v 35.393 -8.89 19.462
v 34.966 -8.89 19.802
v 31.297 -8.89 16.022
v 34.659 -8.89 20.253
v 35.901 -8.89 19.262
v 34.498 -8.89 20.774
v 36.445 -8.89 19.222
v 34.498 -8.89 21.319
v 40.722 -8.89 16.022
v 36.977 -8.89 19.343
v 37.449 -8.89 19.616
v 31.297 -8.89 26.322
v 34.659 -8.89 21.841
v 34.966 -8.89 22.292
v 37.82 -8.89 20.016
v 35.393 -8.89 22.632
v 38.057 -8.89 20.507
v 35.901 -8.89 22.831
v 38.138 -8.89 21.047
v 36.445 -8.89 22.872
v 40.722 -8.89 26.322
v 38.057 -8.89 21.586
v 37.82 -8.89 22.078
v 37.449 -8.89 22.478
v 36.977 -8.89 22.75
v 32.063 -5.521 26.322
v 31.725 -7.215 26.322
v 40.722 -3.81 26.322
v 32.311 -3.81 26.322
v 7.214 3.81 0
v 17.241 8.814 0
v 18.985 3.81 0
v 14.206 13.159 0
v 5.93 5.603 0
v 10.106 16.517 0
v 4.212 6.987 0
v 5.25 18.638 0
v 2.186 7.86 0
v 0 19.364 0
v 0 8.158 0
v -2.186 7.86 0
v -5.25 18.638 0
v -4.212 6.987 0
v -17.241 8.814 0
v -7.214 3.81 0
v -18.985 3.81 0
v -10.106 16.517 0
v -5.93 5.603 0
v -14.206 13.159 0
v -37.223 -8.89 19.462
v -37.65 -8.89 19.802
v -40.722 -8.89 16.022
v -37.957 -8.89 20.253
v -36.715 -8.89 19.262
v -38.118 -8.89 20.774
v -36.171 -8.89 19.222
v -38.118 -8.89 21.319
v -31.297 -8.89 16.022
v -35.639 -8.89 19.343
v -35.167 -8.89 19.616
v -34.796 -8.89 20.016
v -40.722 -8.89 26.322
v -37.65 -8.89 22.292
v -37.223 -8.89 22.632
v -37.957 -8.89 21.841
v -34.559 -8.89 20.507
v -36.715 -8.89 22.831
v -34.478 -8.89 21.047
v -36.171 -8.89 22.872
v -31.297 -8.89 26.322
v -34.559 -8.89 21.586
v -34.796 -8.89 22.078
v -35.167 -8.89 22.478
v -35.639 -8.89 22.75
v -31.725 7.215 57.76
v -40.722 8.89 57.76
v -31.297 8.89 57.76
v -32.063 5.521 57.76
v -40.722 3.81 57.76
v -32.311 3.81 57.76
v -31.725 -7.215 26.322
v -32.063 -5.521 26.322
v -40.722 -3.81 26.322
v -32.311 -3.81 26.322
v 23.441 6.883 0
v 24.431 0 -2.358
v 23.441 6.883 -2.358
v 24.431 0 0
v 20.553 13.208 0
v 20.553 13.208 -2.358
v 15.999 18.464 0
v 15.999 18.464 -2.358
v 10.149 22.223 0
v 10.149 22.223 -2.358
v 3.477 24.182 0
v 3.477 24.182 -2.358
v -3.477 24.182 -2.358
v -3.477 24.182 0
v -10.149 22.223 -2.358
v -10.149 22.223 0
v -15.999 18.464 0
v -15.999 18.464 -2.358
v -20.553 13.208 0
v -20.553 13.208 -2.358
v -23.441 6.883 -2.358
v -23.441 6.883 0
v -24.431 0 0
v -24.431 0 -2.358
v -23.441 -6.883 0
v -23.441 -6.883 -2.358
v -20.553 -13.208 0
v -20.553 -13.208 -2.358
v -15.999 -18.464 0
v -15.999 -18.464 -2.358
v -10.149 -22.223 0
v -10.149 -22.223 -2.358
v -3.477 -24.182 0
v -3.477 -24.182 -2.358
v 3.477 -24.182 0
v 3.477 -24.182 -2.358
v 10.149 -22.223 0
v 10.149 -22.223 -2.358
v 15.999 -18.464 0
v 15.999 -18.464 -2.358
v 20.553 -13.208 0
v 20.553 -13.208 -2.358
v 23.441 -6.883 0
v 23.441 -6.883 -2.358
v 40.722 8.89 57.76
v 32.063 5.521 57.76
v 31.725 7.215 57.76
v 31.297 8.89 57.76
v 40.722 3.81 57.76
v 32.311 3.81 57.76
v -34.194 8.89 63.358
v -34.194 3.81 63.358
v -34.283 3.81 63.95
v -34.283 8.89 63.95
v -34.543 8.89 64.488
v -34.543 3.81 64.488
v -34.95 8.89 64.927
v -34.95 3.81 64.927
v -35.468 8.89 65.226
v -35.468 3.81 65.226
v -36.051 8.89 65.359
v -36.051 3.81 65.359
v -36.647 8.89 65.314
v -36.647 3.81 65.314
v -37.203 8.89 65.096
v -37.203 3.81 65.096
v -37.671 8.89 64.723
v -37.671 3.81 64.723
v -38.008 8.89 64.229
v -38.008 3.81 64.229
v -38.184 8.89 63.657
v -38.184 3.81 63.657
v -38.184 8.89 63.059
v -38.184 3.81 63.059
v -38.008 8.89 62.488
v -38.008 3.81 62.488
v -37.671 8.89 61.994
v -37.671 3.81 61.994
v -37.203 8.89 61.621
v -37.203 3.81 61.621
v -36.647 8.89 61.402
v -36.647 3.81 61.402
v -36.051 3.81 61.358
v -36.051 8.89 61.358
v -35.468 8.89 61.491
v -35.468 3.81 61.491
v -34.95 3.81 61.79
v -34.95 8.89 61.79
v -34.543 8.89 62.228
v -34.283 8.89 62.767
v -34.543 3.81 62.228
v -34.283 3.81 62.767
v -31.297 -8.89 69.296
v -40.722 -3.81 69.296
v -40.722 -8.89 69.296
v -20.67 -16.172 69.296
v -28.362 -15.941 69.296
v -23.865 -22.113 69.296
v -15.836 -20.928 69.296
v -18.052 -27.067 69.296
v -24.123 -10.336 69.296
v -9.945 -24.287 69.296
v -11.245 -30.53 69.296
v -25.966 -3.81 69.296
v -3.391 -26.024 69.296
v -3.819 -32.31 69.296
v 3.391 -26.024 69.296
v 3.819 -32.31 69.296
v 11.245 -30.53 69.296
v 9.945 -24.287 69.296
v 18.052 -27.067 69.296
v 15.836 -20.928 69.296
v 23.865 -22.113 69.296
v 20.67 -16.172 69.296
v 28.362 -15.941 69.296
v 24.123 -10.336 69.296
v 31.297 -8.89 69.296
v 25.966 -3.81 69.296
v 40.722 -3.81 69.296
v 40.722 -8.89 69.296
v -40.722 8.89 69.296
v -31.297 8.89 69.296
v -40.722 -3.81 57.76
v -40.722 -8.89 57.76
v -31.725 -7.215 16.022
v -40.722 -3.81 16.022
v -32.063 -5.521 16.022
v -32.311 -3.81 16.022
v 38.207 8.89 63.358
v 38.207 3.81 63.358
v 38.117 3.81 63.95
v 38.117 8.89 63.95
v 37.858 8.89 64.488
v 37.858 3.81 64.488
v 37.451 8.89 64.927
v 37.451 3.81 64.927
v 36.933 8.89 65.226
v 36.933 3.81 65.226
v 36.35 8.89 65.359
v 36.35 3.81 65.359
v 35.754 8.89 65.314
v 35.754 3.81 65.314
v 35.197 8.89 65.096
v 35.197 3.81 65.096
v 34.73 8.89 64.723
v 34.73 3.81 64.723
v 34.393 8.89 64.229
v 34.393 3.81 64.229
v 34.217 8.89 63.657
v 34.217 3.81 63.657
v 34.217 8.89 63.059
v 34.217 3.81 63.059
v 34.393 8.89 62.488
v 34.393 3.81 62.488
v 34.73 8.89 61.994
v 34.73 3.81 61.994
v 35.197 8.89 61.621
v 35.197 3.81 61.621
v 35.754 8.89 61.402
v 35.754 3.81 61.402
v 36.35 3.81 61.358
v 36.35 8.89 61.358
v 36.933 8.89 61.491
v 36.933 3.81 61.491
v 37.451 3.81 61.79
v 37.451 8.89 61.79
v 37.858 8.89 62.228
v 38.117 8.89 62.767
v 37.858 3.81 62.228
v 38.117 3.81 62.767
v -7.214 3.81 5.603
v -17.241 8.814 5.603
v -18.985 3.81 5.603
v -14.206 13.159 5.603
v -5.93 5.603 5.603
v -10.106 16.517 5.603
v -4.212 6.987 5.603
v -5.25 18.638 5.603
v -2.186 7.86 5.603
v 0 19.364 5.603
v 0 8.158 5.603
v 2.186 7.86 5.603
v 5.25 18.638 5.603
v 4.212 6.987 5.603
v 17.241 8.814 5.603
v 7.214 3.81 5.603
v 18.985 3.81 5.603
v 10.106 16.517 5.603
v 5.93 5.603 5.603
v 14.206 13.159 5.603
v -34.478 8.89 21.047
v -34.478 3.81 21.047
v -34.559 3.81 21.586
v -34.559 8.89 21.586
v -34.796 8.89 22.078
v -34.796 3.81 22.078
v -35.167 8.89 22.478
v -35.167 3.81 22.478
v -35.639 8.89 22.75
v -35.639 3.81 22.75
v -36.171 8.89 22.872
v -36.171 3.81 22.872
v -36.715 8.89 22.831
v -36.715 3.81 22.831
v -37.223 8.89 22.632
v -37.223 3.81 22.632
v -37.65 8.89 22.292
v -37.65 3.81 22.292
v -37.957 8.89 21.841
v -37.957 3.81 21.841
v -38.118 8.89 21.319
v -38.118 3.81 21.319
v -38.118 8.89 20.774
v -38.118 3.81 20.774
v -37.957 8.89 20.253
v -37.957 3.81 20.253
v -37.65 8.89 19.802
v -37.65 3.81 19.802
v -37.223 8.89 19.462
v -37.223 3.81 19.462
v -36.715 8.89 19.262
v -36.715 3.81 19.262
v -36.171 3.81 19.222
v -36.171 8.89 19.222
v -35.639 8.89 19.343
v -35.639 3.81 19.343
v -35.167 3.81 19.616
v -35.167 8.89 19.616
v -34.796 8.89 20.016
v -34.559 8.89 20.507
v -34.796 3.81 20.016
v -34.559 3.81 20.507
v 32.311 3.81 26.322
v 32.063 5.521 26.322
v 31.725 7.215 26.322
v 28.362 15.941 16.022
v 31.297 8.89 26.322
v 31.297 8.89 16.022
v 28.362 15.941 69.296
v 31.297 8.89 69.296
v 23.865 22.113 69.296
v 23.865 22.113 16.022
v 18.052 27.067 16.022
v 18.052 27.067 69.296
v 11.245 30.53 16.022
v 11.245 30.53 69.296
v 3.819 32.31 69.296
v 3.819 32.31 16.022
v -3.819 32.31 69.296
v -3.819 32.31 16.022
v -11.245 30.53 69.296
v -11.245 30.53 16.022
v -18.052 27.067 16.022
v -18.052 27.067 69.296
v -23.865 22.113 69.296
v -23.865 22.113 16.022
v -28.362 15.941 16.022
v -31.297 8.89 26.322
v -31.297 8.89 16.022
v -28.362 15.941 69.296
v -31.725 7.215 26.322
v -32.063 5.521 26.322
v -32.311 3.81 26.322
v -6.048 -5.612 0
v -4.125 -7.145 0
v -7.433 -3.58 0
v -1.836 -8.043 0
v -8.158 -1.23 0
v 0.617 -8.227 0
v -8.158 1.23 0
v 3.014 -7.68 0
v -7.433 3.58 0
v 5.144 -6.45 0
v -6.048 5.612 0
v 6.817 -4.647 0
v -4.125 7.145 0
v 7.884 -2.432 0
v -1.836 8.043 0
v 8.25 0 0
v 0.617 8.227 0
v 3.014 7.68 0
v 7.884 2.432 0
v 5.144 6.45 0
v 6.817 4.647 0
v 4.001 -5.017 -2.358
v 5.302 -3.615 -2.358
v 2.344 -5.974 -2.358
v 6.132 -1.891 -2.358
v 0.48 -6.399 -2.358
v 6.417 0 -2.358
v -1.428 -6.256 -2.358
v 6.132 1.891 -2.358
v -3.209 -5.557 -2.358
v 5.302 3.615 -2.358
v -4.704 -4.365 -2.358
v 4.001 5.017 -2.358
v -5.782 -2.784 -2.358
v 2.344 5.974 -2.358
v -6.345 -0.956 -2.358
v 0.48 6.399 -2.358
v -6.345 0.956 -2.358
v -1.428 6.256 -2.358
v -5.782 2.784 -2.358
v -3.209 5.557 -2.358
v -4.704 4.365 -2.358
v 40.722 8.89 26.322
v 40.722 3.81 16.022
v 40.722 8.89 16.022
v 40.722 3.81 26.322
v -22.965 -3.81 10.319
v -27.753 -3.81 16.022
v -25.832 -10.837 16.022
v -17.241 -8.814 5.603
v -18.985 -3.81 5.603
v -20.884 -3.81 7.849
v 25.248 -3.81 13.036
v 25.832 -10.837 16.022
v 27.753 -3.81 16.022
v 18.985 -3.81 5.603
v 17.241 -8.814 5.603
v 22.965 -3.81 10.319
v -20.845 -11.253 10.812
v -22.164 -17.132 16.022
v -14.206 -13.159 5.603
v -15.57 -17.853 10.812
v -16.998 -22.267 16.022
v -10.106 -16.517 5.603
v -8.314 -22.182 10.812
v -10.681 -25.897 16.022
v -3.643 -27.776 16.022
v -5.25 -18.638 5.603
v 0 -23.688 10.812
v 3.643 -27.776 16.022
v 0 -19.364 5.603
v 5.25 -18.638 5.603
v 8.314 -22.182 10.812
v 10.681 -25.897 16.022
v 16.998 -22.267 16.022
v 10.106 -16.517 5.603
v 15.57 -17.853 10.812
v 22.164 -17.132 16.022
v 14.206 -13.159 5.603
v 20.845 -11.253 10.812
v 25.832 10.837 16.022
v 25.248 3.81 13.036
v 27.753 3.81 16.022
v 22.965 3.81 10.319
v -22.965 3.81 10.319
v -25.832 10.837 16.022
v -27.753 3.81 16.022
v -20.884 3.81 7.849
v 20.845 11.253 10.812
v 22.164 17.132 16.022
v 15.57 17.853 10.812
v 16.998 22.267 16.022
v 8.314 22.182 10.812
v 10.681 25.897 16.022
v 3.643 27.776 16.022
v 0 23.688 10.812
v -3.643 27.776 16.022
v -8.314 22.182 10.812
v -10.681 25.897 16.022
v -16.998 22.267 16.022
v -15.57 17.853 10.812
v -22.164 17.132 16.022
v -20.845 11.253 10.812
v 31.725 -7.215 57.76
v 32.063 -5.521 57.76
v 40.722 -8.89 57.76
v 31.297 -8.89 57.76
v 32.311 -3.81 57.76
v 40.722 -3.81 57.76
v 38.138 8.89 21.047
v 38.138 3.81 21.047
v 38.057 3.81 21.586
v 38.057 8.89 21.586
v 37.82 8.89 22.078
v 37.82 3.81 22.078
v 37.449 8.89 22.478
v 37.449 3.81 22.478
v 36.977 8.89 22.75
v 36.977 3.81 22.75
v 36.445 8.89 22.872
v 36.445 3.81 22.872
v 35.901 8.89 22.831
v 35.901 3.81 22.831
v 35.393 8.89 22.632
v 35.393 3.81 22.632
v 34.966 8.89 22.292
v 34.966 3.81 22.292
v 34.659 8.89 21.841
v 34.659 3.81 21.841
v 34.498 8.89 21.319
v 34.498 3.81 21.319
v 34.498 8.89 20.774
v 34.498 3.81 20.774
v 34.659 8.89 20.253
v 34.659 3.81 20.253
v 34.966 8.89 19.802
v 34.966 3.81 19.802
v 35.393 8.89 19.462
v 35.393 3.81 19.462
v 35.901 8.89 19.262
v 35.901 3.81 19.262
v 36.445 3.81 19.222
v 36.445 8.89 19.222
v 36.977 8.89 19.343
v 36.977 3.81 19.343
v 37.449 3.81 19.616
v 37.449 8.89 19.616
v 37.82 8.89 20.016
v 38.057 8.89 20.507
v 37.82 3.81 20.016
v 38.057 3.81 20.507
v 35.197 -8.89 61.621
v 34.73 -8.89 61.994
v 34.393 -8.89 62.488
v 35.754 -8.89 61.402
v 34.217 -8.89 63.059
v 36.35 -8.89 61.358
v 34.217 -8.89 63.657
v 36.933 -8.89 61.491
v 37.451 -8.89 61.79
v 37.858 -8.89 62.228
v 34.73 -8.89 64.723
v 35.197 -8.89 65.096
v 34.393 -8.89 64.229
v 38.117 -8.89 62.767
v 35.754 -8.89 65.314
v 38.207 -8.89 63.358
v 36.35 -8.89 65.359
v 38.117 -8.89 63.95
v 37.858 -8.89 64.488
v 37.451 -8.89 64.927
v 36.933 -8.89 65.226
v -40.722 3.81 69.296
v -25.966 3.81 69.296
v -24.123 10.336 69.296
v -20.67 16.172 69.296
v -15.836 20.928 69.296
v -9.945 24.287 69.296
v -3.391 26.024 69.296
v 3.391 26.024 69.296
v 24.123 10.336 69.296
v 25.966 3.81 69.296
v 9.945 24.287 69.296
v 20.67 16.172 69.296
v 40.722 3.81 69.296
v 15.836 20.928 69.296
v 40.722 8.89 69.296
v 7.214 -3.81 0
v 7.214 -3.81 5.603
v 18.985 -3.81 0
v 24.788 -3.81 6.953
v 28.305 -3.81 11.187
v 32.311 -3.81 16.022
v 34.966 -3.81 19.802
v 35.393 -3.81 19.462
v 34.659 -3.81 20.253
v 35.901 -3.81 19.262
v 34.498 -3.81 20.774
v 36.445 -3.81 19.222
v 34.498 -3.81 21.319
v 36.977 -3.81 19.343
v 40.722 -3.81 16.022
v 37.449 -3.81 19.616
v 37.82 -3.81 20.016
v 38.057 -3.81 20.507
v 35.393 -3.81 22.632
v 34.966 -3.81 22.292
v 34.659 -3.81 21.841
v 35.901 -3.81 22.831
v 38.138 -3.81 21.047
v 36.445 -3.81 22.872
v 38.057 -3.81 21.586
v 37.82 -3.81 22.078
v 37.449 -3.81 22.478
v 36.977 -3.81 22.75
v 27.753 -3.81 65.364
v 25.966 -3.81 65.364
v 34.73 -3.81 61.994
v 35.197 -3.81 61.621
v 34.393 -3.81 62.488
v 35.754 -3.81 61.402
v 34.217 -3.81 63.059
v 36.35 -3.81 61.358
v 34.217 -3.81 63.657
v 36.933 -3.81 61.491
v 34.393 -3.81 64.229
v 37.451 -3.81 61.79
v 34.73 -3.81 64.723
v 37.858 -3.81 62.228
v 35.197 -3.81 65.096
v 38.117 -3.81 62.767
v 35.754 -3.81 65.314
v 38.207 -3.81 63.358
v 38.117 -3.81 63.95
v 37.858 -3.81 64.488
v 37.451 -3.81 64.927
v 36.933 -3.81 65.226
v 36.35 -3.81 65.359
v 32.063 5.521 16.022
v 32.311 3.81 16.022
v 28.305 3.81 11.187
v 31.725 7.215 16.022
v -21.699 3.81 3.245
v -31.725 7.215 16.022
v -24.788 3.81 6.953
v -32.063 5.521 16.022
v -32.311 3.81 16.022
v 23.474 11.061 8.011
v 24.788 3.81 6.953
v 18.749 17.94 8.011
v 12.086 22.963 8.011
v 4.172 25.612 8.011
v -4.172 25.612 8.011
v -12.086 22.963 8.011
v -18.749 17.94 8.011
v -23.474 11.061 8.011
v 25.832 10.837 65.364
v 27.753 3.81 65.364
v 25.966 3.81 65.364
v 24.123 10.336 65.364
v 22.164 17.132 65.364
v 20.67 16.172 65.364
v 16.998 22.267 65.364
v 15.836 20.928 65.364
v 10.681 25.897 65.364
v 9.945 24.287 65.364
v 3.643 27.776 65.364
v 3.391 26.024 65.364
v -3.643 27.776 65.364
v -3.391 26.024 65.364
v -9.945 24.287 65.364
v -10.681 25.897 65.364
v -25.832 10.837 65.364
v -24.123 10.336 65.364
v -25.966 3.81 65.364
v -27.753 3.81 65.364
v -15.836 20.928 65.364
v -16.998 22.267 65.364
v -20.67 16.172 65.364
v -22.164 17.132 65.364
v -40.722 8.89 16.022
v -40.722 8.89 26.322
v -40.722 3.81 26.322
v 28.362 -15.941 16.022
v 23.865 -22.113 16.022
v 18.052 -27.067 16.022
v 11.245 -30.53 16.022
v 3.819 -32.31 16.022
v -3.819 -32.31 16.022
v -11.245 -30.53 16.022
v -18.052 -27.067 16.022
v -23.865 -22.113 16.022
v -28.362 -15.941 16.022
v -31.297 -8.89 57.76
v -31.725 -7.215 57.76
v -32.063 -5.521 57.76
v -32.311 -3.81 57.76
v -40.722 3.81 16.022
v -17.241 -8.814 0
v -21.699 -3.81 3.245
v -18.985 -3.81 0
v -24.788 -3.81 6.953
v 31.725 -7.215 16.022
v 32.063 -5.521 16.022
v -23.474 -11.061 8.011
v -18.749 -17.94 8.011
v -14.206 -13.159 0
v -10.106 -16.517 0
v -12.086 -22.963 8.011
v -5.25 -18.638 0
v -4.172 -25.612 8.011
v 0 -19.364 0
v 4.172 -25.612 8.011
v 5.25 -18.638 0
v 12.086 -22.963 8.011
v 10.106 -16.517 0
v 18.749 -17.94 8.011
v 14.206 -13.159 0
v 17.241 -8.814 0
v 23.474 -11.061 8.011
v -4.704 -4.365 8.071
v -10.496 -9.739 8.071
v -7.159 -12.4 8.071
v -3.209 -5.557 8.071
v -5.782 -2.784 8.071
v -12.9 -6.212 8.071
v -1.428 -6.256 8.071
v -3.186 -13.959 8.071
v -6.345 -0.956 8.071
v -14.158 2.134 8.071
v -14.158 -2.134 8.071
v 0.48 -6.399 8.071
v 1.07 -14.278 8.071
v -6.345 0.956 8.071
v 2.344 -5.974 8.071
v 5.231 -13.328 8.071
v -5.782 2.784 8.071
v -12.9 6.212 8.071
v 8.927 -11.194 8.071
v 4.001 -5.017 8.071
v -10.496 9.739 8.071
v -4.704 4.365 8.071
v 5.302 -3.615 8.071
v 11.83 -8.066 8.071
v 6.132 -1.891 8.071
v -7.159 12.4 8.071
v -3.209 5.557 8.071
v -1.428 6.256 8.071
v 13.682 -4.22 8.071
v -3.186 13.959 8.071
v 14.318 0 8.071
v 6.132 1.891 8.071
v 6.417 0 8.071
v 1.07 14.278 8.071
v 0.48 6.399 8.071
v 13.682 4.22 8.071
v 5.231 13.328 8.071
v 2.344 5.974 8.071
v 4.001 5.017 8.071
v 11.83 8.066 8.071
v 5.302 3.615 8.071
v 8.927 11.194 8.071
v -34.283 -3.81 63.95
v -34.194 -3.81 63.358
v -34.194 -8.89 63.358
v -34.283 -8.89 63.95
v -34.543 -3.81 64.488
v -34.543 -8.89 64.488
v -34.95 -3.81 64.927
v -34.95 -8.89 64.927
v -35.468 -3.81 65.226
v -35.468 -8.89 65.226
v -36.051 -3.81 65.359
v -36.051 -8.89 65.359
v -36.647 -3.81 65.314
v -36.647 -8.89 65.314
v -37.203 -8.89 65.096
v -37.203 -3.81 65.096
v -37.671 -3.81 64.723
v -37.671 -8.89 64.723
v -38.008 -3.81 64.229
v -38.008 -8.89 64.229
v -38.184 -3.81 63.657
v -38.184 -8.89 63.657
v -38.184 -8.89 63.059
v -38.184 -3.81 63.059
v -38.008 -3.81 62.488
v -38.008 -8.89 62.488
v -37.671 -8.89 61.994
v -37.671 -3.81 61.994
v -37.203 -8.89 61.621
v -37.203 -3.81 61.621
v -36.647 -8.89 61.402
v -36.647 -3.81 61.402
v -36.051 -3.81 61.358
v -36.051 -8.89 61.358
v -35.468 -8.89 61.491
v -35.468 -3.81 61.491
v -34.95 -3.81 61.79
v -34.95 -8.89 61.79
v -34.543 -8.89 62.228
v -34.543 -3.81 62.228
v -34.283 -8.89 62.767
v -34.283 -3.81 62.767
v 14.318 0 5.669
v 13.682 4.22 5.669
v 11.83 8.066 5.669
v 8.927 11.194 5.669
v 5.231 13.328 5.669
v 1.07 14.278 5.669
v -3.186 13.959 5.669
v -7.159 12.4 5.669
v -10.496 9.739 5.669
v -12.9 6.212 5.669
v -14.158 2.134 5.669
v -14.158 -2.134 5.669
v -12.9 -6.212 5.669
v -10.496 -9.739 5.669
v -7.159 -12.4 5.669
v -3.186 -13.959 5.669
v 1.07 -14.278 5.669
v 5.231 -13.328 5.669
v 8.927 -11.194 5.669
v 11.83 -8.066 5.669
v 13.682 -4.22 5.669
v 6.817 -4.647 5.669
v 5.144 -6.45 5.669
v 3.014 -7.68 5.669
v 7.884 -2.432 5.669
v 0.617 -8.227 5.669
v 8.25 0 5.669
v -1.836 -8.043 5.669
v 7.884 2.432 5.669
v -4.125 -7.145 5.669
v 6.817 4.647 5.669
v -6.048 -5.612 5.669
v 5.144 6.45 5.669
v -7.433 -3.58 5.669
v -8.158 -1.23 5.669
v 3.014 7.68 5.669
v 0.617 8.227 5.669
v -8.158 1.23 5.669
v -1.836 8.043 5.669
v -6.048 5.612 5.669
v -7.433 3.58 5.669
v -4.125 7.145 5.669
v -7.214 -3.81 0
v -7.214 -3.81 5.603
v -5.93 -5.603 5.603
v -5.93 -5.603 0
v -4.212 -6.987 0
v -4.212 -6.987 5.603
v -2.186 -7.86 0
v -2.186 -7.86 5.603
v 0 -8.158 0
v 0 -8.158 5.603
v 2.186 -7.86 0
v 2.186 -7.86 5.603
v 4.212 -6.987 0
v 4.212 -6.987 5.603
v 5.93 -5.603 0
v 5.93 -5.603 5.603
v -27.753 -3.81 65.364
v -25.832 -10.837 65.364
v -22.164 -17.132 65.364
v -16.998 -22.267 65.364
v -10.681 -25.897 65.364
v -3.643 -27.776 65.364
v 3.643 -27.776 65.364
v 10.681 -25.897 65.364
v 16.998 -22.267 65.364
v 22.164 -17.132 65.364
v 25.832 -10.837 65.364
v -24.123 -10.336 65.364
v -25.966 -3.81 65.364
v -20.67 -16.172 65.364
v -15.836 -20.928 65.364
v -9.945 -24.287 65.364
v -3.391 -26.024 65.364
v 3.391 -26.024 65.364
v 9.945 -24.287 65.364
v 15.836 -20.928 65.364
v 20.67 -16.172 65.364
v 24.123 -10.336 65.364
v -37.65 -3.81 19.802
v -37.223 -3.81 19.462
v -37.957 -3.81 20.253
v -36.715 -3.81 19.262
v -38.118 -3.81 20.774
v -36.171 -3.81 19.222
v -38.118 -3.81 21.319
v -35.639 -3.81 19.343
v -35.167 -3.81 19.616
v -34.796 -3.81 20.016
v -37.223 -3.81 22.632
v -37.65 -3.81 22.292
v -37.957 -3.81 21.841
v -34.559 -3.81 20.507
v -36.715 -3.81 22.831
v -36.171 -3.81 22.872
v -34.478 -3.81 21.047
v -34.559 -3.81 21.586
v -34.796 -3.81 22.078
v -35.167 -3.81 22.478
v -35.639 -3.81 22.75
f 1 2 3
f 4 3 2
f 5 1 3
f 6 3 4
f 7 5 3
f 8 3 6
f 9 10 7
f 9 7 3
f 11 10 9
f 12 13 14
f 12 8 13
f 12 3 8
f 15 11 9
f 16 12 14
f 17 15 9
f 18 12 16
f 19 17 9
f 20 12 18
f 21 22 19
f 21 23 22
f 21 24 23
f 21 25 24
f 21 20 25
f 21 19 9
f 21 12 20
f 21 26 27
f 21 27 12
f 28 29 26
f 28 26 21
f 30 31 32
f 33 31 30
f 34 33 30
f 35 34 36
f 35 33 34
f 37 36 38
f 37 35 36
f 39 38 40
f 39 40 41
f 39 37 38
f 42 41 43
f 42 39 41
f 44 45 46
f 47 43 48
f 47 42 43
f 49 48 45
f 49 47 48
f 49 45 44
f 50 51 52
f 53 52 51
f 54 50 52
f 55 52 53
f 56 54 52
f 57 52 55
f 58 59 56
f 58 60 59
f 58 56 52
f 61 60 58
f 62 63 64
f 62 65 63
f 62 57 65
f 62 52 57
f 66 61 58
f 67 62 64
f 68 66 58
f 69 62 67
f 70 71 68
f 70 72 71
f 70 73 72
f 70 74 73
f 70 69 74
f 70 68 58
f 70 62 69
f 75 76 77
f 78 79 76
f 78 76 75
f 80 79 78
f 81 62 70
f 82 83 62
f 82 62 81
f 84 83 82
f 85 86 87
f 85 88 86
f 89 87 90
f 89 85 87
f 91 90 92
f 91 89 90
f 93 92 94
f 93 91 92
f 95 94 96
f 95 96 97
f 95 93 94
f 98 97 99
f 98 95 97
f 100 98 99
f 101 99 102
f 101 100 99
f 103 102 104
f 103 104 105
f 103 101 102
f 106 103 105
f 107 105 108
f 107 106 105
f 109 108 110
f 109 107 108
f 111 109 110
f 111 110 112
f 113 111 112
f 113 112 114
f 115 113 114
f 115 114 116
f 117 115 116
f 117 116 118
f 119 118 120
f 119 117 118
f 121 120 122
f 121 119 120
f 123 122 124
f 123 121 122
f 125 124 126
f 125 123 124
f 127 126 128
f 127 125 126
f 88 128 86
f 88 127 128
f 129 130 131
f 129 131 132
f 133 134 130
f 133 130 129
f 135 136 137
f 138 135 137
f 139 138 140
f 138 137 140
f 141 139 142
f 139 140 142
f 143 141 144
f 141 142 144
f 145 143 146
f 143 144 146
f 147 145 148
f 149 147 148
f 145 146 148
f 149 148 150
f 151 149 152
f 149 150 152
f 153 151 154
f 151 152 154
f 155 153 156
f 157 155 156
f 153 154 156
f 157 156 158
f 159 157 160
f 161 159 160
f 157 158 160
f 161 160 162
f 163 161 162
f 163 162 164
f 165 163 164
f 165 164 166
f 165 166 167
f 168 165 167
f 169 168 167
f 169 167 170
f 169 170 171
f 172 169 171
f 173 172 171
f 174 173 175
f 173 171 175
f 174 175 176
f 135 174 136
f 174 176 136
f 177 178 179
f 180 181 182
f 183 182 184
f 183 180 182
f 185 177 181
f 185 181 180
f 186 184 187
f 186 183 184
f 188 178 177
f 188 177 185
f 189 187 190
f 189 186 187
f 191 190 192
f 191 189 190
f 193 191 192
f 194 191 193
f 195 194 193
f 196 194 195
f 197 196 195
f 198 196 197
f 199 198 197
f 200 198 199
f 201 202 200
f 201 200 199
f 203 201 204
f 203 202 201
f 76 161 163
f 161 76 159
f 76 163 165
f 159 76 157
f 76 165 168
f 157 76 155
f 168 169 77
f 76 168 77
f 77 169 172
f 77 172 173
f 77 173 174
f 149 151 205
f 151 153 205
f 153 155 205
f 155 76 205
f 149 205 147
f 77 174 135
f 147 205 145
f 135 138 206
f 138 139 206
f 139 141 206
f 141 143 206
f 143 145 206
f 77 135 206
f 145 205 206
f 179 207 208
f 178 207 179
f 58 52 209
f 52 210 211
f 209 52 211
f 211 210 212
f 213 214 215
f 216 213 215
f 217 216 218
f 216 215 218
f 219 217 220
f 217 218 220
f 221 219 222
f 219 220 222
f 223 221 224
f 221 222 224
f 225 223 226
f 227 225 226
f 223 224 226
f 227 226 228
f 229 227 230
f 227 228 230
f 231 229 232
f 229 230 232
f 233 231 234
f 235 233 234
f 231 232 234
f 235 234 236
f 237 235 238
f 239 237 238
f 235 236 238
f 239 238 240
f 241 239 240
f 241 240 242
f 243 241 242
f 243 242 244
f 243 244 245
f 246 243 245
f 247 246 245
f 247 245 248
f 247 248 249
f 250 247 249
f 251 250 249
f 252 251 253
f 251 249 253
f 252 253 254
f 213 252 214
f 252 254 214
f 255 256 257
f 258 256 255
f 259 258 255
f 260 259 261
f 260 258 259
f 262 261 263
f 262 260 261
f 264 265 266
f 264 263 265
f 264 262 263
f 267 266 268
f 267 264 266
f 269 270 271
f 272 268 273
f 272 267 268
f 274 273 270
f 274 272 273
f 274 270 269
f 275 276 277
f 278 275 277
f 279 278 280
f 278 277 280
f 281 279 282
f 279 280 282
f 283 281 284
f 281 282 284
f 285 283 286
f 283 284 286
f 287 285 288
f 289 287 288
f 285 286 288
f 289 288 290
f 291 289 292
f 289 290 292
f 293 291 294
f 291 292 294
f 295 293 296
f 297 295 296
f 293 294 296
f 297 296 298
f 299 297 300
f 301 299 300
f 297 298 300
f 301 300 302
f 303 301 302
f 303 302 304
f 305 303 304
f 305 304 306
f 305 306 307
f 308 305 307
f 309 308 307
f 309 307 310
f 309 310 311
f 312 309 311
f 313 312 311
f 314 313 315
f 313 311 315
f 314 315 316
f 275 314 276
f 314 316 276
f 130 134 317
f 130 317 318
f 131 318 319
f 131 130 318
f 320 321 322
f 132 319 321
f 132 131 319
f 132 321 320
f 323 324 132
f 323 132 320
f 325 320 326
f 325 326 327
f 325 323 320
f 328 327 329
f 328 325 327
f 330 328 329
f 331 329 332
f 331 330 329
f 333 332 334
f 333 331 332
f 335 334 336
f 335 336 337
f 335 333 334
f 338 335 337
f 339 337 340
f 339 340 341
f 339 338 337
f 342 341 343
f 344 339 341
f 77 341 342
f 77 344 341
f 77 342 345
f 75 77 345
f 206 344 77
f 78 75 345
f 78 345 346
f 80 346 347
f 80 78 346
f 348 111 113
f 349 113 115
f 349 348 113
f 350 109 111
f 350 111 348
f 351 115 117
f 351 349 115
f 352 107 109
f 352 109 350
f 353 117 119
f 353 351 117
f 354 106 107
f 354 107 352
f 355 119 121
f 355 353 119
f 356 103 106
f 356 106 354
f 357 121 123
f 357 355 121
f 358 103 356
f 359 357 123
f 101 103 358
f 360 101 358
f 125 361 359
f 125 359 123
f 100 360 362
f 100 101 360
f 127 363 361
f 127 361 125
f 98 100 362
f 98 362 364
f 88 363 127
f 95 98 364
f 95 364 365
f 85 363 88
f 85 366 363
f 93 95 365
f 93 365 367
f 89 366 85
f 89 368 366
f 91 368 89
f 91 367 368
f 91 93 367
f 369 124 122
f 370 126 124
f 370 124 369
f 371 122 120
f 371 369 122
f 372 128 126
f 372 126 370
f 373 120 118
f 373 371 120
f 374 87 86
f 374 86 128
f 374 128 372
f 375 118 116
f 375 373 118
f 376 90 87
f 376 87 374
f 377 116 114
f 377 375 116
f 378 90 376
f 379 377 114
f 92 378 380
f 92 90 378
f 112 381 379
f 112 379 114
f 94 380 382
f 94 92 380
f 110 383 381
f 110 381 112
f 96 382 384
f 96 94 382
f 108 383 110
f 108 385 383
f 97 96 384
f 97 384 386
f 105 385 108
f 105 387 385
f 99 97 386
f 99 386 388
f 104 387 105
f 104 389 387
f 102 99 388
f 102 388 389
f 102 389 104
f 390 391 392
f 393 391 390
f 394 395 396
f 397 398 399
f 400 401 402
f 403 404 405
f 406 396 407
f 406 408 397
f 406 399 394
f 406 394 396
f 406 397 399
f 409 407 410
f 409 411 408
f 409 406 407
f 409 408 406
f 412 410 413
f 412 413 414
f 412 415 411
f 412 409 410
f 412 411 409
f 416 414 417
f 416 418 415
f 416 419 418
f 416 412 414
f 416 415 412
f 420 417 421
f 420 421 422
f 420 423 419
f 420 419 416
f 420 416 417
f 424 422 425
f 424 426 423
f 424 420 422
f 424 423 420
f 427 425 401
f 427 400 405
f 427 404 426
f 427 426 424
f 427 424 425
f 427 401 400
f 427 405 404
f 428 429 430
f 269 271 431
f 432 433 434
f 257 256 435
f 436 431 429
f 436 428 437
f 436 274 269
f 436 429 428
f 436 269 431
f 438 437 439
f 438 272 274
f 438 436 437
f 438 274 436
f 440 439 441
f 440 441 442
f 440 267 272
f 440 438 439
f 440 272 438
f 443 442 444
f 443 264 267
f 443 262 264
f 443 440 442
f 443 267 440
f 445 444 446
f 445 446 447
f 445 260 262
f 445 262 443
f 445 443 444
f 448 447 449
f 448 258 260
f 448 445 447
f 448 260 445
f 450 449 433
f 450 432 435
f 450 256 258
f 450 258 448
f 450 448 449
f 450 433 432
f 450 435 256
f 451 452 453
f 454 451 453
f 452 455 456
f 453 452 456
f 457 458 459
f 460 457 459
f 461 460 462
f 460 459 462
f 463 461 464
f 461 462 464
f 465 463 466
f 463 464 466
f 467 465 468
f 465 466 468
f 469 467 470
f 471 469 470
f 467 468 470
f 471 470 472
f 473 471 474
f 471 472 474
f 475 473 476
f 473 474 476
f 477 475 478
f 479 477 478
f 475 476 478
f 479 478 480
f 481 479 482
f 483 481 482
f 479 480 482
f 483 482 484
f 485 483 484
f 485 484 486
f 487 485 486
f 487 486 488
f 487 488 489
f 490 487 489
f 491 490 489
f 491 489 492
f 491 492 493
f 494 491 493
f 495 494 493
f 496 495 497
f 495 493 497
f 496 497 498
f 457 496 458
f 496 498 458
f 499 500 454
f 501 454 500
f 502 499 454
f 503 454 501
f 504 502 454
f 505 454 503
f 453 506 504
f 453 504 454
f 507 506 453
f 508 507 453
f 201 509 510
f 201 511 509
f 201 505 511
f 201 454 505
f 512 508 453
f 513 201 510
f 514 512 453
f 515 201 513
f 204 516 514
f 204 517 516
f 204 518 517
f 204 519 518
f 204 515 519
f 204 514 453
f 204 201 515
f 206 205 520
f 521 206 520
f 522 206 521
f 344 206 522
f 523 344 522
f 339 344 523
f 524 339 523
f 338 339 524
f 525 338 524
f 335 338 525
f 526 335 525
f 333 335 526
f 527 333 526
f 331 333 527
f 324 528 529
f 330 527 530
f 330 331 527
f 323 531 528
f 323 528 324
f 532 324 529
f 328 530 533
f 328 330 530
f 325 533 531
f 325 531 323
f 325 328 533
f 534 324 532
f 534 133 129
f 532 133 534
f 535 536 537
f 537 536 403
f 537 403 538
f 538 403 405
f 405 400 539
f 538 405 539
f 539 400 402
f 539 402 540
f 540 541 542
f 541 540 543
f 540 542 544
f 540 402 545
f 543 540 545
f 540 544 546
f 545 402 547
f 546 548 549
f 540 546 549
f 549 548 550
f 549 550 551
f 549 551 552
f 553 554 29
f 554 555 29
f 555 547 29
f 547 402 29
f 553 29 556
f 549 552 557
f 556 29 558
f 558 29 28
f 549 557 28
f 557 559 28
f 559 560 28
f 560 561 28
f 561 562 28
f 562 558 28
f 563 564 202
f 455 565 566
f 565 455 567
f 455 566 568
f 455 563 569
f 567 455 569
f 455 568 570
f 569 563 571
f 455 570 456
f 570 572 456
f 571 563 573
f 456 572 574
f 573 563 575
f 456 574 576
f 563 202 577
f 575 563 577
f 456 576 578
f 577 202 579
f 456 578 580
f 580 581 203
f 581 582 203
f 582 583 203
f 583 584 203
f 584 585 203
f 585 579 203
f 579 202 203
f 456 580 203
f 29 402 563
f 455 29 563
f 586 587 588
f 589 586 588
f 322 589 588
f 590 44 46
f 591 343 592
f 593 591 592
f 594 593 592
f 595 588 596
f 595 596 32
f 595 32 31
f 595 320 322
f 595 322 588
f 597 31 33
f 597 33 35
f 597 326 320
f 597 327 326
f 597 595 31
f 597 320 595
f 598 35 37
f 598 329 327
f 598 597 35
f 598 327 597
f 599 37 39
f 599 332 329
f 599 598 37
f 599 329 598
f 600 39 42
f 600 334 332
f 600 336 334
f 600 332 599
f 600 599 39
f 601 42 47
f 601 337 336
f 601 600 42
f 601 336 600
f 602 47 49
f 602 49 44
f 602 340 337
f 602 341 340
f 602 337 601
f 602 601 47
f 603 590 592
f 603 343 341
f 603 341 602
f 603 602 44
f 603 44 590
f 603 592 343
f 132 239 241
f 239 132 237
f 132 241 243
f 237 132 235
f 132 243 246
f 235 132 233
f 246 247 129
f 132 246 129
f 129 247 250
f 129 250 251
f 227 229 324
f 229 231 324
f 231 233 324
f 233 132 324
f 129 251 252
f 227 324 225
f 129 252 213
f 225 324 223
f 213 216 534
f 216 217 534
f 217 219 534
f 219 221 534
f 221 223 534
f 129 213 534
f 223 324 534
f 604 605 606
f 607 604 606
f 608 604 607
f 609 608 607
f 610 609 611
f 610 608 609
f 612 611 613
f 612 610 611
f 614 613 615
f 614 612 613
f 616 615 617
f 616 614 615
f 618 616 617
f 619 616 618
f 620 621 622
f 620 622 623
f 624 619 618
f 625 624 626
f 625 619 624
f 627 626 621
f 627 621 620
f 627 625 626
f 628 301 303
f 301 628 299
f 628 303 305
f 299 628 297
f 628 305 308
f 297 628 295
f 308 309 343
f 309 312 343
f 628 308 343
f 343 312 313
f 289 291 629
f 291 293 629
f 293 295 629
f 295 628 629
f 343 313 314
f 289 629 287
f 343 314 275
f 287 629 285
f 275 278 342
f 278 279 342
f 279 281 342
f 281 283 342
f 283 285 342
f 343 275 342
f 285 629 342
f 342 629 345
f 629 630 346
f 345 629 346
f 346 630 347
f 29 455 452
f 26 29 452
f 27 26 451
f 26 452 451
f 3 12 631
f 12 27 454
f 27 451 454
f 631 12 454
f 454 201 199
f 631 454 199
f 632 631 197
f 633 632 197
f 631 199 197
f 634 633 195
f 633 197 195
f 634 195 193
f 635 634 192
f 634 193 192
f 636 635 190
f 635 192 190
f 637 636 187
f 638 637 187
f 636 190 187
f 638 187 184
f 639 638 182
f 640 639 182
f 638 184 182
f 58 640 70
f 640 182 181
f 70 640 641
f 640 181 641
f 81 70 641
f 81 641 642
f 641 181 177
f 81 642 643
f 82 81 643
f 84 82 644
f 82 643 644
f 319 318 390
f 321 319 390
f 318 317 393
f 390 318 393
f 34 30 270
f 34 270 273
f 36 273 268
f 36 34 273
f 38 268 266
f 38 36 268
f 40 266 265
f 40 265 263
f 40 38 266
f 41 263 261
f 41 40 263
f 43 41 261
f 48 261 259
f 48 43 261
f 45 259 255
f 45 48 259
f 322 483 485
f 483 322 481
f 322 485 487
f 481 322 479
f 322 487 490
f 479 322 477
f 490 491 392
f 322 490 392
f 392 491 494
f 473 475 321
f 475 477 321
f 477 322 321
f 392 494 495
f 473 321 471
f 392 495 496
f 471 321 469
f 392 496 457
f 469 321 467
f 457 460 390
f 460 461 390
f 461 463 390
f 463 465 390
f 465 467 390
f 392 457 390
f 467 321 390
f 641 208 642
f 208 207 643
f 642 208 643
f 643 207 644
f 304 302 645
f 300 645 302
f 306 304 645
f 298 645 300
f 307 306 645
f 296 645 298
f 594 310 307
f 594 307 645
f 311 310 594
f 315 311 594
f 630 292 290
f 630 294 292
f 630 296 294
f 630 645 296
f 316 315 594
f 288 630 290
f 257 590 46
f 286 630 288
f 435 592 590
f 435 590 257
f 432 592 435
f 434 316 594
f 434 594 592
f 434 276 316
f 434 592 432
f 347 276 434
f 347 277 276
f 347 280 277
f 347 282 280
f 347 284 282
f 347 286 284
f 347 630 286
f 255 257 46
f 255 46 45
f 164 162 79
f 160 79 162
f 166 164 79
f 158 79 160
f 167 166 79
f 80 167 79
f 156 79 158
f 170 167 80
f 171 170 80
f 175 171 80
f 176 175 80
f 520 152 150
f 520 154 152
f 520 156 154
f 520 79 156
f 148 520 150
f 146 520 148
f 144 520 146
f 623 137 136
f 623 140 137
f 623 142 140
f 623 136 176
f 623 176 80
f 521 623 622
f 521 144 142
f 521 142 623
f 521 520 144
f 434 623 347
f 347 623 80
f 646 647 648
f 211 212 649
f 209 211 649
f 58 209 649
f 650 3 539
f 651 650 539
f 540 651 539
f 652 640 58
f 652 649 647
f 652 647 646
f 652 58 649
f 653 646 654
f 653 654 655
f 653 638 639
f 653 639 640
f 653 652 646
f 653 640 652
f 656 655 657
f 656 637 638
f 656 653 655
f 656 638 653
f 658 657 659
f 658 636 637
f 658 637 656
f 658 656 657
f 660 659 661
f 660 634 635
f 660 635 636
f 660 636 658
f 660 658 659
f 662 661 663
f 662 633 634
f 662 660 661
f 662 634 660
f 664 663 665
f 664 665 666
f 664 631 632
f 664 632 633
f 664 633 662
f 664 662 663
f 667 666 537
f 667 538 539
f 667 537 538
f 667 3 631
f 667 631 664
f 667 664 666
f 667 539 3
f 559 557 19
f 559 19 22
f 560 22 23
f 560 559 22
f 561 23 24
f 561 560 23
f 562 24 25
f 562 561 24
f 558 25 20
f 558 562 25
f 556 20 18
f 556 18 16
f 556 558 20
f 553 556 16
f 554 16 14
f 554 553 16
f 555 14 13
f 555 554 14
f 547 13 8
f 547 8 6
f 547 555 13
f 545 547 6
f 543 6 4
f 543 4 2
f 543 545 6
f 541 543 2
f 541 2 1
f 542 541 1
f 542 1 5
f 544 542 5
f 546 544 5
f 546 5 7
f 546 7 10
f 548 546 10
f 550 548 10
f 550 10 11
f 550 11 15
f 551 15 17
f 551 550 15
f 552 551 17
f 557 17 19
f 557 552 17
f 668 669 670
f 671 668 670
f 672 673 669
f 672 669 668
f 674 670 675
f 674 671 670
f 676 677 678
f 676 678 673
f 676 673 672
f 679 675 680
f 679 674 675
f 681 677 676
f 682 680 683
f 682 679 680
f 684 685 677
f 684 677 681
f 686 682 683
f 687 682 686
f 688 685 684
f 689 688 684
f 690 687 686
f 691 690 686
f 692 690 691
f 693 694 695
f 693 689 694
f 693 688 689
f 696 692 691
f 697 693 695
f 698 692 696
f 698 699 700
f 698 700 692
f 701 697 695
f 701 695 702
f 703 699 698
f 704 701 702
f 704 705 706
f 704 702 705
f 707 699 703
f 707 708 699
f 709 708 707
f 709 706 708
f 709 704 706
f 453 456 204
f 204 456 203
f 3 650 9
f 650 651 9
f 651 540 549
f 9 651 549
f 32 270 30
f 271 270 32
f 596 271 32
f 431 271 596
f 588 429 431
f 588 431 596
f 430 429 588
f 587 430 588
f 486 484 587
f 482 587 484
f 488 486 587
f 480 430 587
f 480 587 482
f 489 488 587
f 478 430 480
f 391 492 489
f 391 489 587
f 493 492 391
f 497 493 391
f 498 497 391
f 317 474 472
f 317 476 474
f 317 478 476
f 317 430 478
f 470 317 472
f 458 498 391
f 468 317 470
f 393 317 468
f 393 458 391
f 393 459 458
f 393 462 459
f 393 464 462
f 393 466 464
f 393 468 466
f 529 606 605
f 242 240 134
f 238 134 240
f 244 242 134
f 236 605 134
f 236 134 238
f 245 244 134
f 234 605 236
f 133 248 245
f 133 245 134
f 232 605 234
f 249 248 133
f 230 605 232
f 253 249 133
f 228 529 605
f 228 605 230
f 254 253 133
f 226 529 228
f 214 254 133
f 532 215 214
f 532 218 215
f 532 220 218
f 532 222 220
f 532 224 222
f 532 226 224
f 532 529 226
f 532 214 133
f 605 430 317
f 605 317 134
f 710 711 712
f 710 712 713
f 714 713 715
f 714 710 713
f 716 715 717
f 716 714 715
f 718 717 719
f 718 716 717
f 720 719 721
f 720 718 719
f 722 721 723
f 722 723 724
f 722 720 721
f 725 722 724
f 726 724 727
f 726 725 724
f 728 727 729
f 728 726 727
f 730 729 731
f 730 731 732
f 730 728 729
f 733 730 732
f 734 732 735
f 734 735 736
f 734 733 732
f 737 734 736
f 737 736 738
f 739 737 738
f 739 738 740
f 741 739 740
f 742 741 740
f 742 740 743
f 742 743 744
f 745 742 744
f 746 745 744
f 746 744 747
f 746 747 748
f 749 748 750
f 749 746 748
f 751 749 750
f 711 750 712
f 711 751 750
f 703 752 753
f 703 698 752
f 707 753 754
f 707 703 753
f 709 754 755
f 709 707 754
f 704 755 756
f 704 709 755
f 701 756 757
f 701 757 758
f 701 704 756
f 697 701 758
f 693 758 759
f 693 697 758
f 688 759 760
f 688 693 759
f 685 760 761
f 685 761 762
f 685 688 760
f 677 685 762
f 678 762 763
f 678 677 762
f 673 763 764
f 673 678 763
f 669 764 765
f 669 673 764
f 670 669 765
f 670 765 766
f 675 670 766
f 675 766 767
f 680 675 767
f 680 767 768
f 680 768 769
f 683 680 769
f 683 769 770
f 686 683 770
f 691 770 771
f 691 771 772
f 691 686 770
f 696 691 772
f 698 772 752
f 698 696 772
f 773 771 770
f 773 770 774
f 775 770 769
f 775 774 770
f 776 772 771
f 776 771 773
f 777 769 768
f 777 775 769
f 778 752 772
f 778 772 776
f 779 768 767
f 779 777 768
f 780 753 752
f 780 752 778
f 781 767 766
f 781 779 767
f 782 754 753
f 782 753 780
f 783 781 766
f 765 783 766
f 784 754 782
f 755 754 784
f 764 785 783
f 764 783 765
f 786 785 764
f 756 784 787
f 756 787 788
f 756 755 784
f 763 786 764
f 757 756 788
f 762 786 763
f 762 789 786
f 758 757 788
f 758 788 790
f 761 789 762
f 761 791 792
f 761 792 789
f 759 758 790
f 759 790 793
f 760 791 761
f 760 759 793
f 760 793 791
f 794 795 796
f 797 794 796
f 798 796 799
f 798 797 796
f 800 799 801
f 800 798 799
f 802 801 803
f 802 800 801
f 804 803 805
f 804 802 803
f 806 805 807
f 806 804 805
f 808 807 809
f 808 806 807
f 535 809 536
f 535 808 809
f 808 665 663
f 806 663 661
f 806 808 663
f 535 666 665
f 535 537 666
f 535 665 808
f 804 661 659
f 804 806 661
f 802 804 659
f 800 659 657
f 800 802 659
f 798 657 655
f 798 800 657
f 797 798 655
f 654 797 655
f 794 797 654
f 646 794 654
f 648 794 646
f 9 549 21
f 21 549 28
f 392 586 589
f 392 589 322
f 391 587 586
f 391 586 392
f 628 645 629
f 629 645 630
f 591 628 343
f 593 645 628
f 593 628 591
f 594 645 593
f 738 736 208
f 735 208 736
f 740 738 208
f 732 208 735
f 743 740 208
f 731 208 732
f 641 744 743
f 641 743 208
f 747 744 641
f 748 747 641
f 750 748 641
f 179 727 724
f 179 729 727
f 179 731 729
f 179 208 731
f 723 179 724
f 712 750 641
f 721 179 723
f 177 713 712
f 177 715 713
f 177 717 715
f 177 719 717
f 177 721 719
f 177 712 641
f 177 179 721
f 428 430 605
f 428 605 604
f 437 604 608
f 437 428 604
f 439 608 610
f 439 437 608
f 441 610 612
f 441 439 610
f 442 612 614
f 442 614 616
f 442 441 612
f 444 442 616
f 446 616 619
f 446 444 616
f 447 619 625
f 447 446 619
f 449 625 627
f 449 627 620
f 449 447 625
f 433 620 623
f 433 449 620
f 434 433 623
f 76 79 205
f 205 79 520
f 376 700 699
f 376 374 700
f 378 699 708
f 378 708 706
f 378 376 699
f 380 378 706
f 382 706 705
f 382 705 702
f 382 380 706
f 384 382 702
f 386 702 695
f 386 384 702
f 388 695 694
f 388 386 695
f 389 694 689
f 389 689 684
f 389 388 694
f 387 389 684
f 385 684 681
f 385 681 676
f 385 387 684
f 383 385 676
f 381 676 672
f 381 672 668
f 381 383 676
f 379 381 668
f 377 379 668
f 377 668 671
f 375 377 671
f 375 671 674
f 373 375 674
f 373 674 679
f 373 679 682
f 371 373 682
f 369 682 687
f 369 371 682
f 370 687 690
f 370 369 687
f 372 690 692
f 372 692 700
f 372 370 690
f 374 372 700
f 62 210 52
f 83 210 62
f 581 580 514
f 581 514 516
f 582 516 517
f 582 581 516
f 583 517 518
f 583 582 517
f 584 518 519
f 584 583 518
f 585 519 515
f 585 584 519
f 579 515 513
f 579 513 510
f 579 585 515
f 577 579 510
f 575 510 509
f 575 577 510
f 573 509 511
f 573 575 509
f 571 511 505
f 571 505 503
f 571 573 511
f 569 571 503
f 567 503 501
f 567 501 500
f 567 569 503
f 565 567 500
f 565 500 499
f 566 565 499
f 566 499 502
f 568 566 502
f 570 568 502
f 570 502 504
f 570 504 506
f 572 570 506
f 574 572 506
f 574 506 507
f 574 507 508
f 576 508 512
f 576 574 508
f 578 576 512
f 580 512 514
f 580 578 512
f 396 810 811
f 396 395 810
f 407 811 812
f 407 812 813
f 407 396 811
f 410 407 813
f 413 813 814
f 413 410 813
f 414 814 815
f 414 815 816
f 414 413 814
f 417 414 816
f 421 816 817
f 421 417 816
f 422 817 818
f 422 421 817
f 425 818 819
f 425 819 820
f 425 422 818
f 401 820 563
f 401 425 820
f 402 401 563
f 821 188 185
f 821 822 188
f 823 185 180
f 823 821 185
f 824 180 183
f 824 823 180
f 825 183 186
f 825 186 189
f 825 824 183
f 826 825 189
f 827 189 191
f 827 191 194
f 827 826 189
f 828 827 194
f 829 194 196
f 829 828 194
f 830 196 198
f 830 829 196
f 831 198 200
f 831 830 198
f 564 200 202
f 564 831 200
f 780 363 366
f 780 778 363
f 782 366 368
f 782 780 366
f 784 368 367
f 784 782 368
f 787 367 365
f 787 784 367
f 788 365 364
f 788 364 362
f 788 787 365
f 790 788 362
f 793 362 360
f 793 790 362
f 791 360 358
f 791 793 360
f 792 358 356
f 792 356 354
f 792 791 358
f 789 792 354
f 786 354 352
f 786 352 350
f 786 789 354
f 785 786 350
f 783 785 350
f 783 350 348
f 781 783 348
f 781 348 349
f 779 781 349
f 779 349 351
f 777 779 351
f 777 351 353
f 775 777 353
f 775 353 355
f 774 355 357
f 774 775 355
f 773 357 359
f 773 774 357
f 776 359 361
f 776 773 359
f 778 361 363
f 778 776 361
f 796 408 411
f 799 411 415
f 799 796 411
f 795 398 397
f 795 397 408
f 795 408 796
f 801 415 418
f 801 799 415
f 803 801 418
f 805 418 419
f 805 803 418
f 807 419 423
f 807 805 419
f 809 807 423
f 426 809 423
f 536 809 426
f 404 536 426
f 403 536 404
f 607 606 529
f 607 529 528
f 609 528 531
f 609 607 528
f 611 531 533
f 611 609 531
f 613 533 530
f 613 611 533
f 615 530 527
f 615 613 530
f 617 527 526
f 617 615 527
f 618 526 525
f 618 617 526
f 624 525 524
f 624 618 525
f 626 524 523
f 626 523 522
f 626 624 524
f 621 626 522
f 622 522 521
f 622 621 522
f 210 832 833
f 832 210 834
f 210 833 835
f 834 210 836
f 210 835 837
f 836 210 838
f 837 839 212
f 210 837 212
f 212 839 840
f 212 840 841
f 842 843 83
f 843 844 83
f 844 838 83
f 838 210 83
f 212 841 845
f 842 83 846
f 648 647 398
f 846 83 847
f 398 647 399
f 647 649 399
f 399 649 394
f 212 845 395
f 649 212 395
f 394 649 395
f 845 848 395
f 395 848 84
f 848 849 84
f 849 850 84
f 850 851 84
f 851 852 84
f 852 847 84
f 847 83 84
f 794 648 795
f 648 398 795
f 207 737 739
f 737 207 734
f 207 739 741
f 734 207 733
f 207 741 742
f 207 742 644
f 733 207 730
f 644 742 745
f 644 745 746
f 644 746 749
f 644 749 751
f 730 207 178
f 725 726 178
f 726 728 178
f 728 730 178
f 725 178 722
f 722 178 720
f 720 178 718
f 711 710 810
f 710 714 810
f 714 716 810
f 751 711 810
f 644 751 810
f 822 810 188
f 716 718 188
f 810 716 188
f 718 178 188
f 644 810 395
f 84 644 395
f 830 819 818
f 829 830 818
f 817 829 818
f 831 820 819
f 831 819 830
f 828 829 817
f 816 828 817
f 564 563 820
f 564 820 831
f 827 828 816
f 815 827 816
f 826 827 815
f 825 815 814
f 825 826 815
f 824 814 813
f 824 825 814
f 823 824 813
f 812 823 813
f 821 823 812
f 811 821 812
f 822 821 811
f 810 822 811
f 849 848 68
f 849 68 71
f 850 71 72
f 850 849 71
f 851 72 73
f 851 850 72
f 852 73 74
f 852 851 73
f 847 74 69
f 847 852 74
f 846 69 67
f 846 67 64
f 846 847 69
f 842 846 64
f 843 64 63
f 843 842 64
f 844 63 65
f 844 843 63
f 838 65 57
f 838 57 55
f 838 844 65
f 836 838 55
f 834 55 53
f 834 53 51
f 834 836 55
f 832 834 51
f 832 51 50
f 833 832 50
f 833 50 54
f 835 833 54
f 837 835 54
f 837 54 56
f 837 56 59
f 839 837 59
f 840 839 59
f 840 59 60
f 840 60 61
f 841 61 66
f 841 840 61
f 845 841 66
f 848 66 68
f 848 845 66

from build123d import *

# Parameters (mm, degrees)
F2_W     = 82.369022
F2_H     = 85.514376
F3_DEPTH = 3.81
F4_W     = 12.96926
F4_H     = 10.300532
F4_R     = 1.830272
F4_H_2   = 11.536308
F4_R_2   = 2.006128
F5_DEPTH = 5.08


with BuildPart() as f1:
    # F0 (on Front) → F1 (revolve)
    with BuildSketch(Plane.XZ):
        Polygon((8.158268, 0), (19.363601, 0), (32.534778, 16.021658), (32.534778, 69.296129), (26.244067, 69.296129), (26.244067, 65.364435), (28.01333, 65.364435), (28.01333, 16.021658), (19.363601, 5.602666), (8.158268, 5.602666), align=None)
    revolve(axis=Axis((0, 0, 31.502709), (0, 0, 1)))

    # F2 (on Front) → F3 (cut, symmetric)
    with BuildSketch(Plane.XZ):
        with Locations((2.948772, 30.863809)):
            Rectangle(F2_W, F2_H)
    extrude(amount=F3_DEPTH, both=True, mode=Mode.SUBTRACT)

    # F4 (on face) → F5 (join)
    with BuildSketch(Plane.XZ.offset(-3.81)):
        with Locations((34.237658, 21.171924)):
            Rectangle(F4_W, F4_H)
        with Locations((36.308099, 21.046696)):
            Circle(F4_R, mode=Mode.SUBTRACT)
        with Locations((34.237658, 63.527975)):
            Rectangle(F4_W, F4_H_2)
        with Locations((36.200434, 63.358307)):
            Circle(F4_R_2, mode=Mode.SUBTRACT)
        with Locations((-34.237658, 63.527975)):
            Rectangle(F4_W, F4_H_2)
        with Locations((-36.200434, 63.358307)):
            Circle(F4_R_2, mode=Mode.SUBTRACT)
        with Locations((-34.237658, 21.171924)):
            Rectangle(F4_W, F4_H)
        with Locations((-36.308099, 21.046696)):
            Circle(F4_R, mode=Mode.SUBTRACT)
    extrude(amount=-F5_DEPTH)

    # F6: F1 across plane


with BuildPart() as f1_1:
    add(f1.part)
    add(f1.part.mirror(Plane.XZ))


with BuildPart() as f8:
    # F7 (on Front) → F8 (revolve)
    with BuildSketch(Plane.XZ):
        Polygon((8.25013, 0), (8.25013, 5.668839), (14.317914, 5.668839), (14.317914, 8.07067), (6.417154, 8.07067), (6.417154, -2.358333), (24.430886, -2.358333), (24.430886, 0), align=None)
    revolve(axis=Axis((0, 0, 31.502709), (0, 0, 1)))


solid = Compound([f1_1.part, f8.part])
